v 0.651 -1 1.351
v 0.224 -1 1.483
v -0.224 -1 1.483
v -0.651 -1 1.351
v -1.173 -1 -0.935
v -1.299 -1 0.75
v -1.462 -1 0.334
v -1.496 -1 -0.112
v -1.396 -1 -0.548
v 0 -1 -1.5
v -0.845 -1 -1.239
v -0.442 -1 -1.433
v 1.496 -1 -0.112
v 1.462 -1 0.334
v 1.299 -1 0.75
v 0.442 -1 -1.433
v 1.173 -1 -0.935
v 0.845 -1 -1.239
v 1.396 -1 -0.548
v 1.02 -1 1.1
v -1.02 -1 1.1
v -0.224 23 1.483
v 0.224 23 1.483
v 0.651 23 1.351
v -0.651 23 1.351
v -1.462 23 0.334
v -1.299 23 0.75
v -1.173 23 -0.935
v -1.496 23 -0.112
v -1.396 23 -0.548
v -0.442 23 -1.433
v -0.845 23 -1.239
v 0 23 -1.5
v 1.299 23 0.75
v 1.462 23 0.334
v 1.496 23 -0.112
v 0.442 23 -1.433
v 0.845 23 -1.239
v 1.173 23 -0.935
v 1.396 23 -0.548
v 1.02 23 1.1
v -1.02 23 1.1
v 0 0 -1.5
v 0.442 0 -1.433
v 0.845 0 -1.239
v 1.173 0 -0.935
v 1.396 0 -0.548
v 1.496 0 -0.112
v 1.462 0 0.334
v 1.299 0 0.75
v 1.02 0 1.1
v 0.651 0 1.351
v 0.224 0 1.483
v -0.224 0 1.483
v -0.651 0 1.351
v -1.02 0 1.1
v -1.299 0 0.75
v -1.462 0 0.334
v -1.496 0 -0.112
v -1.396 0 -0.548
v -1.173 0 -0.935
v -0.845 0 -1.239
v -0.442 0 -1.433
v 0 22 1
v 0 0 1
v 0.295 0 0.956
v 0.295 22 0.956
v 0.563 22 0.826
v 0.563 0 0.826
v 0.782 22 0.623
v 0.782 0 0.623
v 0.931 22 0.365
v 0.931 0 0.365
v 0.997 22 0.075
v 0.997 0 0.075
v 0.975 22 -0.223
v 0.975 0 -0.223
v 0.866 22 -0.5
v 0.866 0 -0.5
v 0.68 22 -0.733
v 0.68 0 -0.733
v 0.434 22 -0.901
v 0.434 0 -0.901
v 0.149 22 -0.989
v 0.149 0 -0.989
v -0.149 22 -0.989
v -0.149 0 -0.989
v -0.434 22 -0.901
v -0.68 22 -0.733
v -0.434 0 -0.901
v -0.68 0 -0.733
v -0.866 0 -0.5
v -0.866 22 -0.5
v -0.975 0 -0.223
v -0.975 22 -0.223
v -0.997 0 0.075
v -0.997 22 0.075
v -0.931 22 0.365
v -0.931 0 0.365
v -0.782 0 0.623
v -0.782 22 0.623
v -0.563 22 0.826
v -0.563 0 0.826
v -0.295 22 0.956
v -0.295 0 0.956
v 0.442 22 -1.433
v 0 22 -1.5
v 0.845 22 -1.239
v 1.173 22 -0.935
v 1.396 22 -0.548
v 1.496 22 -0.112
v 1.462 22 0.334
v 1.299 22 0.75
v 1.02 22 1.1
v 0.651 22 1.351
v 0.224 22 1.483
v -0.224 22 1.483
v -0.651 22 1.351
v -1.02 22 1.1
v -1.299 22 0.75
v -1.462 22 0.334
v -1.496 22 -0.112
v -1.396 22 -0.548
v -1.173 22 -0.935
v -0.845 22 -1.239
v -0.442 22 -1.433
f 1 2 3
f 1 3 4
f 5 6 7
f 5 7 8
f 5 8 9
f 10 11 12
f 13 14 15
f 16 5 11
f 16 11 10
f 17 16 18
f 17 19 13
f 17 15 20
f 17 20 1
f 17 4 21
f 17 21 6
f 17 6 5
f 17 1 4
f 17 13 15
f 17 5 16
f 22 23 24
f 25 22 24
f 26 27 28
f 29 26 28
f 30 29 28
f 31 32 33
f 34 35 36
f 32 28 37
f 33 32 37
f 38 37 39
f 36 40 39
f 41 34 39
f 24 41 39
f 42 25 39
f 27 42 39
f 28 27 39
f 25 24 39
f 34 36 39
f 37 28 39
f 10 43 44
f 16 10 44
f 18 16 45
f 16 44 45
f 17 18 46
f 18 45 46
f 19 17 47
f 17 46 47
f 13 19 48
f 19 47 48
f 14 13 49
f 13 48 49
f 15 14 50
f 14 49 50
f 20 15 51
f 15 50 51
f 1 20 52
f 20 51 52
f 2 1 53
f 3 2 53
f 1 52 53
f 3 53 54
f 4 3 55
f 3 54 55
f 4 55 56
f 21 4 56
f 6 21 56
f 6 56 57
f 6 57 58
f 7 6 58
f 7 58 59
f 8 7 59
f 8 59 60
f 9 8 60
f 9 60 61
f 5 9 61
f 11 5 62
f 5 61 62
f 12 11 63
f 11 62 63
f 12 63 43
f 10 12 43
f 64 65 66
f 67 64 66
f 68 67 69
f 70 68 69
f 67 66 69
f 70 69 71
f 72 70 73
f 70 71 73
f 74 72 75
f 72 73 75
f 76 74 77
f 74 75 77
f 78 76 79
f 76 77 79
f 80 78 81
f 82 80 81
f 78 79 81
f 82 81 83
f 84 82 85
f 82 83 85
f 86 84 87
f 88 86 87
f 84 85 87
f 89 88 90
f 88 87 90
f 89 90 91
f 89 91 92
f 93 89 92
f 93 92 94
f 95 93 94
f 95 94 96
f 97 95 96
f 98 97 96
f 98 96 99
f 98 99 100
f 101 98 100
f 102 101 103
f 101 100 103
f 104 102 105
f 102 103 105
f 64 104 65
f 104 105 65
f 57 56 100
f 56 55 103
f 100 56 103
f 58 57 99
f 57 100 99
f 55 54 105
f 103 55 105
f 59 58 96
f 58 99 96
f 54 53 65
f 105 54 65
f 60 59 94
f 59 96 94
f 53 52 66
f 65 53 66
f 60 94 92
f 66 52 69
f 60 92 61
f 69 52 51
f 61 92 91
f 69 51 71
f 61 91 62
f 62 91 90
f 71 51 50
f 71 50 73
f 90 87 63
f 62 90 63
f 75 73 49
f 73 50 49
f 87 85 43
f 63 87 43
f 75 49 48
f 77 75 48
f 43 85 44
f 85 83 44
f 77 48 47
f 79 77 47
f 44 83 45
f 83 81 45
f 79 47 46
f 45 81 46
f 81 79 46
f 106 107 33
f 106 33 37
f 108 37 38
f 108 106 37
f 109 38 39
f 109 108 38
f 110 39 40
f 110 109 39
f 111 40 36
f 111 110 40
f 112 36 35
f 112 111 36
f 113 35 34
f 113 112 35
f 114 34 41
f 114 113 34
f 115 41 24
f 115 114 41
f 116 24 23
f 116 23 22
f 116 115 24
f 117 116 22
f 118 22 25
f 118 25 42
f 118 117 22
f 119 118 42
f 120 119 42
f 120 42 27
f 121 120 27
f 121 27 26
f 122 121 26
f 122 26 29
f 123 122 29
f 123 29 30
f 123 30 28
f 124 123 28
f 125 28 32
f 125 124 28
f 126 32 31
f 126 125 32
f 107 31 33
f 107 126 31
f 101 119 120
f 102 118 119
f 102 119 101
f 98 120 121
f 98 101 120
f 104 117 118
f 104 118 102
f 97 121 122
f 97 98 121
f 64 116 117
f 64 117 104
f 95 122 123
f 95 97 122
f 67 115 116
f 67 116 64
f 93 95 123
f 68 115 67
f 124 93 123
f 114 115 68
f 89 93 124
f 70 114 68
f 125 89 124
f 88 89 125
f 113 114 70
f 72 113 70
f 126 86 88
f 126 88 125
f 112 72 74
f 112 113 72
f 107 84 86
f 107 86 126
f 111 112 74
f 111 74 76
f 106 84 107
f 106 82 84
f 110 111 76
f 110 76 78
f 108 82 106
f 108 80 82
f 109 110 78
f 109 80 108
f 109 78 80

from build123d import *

# Parameters (mm, degrees)
SKETCH1_R           = 1
BOSS_EXTRUDE1_DEPTH = 22
SKETCH2_R           = 1.5
BOSS_EXTRUDE2_DEPTH = 1


with BuildPart() as part:
    # Sketch1 → Boss-Extrude1 (new body)
    with BuildSketch(Plane(origin=(0, 0, 0), x_dir=(1, 0, 0), z_dir=(0, 1, 0))):
        with Locations(Location((0, 0, 0), (0, 0, 270))):
            Circle(SKETCH1_R)
    extrude(amount=BOSS_EXTRUDE1_DEPTH)

    # Sketch2 → Boss-Extrude2 (add)
    with BuildSketch(Plane.XZ):
        with Locations(Location((0, 0, 0), (0, 0, 270))):
            Circle(SKETCH2_R)
    boss_extrude2 = extrude(amount=BOSS_EXTRUDE2_DEPTH)

    # Mirror2: Boss-Extrude2 across plane
    add(boss_extrude2.mirror(Plane.ZX.offset(11)))


solid = part.part
